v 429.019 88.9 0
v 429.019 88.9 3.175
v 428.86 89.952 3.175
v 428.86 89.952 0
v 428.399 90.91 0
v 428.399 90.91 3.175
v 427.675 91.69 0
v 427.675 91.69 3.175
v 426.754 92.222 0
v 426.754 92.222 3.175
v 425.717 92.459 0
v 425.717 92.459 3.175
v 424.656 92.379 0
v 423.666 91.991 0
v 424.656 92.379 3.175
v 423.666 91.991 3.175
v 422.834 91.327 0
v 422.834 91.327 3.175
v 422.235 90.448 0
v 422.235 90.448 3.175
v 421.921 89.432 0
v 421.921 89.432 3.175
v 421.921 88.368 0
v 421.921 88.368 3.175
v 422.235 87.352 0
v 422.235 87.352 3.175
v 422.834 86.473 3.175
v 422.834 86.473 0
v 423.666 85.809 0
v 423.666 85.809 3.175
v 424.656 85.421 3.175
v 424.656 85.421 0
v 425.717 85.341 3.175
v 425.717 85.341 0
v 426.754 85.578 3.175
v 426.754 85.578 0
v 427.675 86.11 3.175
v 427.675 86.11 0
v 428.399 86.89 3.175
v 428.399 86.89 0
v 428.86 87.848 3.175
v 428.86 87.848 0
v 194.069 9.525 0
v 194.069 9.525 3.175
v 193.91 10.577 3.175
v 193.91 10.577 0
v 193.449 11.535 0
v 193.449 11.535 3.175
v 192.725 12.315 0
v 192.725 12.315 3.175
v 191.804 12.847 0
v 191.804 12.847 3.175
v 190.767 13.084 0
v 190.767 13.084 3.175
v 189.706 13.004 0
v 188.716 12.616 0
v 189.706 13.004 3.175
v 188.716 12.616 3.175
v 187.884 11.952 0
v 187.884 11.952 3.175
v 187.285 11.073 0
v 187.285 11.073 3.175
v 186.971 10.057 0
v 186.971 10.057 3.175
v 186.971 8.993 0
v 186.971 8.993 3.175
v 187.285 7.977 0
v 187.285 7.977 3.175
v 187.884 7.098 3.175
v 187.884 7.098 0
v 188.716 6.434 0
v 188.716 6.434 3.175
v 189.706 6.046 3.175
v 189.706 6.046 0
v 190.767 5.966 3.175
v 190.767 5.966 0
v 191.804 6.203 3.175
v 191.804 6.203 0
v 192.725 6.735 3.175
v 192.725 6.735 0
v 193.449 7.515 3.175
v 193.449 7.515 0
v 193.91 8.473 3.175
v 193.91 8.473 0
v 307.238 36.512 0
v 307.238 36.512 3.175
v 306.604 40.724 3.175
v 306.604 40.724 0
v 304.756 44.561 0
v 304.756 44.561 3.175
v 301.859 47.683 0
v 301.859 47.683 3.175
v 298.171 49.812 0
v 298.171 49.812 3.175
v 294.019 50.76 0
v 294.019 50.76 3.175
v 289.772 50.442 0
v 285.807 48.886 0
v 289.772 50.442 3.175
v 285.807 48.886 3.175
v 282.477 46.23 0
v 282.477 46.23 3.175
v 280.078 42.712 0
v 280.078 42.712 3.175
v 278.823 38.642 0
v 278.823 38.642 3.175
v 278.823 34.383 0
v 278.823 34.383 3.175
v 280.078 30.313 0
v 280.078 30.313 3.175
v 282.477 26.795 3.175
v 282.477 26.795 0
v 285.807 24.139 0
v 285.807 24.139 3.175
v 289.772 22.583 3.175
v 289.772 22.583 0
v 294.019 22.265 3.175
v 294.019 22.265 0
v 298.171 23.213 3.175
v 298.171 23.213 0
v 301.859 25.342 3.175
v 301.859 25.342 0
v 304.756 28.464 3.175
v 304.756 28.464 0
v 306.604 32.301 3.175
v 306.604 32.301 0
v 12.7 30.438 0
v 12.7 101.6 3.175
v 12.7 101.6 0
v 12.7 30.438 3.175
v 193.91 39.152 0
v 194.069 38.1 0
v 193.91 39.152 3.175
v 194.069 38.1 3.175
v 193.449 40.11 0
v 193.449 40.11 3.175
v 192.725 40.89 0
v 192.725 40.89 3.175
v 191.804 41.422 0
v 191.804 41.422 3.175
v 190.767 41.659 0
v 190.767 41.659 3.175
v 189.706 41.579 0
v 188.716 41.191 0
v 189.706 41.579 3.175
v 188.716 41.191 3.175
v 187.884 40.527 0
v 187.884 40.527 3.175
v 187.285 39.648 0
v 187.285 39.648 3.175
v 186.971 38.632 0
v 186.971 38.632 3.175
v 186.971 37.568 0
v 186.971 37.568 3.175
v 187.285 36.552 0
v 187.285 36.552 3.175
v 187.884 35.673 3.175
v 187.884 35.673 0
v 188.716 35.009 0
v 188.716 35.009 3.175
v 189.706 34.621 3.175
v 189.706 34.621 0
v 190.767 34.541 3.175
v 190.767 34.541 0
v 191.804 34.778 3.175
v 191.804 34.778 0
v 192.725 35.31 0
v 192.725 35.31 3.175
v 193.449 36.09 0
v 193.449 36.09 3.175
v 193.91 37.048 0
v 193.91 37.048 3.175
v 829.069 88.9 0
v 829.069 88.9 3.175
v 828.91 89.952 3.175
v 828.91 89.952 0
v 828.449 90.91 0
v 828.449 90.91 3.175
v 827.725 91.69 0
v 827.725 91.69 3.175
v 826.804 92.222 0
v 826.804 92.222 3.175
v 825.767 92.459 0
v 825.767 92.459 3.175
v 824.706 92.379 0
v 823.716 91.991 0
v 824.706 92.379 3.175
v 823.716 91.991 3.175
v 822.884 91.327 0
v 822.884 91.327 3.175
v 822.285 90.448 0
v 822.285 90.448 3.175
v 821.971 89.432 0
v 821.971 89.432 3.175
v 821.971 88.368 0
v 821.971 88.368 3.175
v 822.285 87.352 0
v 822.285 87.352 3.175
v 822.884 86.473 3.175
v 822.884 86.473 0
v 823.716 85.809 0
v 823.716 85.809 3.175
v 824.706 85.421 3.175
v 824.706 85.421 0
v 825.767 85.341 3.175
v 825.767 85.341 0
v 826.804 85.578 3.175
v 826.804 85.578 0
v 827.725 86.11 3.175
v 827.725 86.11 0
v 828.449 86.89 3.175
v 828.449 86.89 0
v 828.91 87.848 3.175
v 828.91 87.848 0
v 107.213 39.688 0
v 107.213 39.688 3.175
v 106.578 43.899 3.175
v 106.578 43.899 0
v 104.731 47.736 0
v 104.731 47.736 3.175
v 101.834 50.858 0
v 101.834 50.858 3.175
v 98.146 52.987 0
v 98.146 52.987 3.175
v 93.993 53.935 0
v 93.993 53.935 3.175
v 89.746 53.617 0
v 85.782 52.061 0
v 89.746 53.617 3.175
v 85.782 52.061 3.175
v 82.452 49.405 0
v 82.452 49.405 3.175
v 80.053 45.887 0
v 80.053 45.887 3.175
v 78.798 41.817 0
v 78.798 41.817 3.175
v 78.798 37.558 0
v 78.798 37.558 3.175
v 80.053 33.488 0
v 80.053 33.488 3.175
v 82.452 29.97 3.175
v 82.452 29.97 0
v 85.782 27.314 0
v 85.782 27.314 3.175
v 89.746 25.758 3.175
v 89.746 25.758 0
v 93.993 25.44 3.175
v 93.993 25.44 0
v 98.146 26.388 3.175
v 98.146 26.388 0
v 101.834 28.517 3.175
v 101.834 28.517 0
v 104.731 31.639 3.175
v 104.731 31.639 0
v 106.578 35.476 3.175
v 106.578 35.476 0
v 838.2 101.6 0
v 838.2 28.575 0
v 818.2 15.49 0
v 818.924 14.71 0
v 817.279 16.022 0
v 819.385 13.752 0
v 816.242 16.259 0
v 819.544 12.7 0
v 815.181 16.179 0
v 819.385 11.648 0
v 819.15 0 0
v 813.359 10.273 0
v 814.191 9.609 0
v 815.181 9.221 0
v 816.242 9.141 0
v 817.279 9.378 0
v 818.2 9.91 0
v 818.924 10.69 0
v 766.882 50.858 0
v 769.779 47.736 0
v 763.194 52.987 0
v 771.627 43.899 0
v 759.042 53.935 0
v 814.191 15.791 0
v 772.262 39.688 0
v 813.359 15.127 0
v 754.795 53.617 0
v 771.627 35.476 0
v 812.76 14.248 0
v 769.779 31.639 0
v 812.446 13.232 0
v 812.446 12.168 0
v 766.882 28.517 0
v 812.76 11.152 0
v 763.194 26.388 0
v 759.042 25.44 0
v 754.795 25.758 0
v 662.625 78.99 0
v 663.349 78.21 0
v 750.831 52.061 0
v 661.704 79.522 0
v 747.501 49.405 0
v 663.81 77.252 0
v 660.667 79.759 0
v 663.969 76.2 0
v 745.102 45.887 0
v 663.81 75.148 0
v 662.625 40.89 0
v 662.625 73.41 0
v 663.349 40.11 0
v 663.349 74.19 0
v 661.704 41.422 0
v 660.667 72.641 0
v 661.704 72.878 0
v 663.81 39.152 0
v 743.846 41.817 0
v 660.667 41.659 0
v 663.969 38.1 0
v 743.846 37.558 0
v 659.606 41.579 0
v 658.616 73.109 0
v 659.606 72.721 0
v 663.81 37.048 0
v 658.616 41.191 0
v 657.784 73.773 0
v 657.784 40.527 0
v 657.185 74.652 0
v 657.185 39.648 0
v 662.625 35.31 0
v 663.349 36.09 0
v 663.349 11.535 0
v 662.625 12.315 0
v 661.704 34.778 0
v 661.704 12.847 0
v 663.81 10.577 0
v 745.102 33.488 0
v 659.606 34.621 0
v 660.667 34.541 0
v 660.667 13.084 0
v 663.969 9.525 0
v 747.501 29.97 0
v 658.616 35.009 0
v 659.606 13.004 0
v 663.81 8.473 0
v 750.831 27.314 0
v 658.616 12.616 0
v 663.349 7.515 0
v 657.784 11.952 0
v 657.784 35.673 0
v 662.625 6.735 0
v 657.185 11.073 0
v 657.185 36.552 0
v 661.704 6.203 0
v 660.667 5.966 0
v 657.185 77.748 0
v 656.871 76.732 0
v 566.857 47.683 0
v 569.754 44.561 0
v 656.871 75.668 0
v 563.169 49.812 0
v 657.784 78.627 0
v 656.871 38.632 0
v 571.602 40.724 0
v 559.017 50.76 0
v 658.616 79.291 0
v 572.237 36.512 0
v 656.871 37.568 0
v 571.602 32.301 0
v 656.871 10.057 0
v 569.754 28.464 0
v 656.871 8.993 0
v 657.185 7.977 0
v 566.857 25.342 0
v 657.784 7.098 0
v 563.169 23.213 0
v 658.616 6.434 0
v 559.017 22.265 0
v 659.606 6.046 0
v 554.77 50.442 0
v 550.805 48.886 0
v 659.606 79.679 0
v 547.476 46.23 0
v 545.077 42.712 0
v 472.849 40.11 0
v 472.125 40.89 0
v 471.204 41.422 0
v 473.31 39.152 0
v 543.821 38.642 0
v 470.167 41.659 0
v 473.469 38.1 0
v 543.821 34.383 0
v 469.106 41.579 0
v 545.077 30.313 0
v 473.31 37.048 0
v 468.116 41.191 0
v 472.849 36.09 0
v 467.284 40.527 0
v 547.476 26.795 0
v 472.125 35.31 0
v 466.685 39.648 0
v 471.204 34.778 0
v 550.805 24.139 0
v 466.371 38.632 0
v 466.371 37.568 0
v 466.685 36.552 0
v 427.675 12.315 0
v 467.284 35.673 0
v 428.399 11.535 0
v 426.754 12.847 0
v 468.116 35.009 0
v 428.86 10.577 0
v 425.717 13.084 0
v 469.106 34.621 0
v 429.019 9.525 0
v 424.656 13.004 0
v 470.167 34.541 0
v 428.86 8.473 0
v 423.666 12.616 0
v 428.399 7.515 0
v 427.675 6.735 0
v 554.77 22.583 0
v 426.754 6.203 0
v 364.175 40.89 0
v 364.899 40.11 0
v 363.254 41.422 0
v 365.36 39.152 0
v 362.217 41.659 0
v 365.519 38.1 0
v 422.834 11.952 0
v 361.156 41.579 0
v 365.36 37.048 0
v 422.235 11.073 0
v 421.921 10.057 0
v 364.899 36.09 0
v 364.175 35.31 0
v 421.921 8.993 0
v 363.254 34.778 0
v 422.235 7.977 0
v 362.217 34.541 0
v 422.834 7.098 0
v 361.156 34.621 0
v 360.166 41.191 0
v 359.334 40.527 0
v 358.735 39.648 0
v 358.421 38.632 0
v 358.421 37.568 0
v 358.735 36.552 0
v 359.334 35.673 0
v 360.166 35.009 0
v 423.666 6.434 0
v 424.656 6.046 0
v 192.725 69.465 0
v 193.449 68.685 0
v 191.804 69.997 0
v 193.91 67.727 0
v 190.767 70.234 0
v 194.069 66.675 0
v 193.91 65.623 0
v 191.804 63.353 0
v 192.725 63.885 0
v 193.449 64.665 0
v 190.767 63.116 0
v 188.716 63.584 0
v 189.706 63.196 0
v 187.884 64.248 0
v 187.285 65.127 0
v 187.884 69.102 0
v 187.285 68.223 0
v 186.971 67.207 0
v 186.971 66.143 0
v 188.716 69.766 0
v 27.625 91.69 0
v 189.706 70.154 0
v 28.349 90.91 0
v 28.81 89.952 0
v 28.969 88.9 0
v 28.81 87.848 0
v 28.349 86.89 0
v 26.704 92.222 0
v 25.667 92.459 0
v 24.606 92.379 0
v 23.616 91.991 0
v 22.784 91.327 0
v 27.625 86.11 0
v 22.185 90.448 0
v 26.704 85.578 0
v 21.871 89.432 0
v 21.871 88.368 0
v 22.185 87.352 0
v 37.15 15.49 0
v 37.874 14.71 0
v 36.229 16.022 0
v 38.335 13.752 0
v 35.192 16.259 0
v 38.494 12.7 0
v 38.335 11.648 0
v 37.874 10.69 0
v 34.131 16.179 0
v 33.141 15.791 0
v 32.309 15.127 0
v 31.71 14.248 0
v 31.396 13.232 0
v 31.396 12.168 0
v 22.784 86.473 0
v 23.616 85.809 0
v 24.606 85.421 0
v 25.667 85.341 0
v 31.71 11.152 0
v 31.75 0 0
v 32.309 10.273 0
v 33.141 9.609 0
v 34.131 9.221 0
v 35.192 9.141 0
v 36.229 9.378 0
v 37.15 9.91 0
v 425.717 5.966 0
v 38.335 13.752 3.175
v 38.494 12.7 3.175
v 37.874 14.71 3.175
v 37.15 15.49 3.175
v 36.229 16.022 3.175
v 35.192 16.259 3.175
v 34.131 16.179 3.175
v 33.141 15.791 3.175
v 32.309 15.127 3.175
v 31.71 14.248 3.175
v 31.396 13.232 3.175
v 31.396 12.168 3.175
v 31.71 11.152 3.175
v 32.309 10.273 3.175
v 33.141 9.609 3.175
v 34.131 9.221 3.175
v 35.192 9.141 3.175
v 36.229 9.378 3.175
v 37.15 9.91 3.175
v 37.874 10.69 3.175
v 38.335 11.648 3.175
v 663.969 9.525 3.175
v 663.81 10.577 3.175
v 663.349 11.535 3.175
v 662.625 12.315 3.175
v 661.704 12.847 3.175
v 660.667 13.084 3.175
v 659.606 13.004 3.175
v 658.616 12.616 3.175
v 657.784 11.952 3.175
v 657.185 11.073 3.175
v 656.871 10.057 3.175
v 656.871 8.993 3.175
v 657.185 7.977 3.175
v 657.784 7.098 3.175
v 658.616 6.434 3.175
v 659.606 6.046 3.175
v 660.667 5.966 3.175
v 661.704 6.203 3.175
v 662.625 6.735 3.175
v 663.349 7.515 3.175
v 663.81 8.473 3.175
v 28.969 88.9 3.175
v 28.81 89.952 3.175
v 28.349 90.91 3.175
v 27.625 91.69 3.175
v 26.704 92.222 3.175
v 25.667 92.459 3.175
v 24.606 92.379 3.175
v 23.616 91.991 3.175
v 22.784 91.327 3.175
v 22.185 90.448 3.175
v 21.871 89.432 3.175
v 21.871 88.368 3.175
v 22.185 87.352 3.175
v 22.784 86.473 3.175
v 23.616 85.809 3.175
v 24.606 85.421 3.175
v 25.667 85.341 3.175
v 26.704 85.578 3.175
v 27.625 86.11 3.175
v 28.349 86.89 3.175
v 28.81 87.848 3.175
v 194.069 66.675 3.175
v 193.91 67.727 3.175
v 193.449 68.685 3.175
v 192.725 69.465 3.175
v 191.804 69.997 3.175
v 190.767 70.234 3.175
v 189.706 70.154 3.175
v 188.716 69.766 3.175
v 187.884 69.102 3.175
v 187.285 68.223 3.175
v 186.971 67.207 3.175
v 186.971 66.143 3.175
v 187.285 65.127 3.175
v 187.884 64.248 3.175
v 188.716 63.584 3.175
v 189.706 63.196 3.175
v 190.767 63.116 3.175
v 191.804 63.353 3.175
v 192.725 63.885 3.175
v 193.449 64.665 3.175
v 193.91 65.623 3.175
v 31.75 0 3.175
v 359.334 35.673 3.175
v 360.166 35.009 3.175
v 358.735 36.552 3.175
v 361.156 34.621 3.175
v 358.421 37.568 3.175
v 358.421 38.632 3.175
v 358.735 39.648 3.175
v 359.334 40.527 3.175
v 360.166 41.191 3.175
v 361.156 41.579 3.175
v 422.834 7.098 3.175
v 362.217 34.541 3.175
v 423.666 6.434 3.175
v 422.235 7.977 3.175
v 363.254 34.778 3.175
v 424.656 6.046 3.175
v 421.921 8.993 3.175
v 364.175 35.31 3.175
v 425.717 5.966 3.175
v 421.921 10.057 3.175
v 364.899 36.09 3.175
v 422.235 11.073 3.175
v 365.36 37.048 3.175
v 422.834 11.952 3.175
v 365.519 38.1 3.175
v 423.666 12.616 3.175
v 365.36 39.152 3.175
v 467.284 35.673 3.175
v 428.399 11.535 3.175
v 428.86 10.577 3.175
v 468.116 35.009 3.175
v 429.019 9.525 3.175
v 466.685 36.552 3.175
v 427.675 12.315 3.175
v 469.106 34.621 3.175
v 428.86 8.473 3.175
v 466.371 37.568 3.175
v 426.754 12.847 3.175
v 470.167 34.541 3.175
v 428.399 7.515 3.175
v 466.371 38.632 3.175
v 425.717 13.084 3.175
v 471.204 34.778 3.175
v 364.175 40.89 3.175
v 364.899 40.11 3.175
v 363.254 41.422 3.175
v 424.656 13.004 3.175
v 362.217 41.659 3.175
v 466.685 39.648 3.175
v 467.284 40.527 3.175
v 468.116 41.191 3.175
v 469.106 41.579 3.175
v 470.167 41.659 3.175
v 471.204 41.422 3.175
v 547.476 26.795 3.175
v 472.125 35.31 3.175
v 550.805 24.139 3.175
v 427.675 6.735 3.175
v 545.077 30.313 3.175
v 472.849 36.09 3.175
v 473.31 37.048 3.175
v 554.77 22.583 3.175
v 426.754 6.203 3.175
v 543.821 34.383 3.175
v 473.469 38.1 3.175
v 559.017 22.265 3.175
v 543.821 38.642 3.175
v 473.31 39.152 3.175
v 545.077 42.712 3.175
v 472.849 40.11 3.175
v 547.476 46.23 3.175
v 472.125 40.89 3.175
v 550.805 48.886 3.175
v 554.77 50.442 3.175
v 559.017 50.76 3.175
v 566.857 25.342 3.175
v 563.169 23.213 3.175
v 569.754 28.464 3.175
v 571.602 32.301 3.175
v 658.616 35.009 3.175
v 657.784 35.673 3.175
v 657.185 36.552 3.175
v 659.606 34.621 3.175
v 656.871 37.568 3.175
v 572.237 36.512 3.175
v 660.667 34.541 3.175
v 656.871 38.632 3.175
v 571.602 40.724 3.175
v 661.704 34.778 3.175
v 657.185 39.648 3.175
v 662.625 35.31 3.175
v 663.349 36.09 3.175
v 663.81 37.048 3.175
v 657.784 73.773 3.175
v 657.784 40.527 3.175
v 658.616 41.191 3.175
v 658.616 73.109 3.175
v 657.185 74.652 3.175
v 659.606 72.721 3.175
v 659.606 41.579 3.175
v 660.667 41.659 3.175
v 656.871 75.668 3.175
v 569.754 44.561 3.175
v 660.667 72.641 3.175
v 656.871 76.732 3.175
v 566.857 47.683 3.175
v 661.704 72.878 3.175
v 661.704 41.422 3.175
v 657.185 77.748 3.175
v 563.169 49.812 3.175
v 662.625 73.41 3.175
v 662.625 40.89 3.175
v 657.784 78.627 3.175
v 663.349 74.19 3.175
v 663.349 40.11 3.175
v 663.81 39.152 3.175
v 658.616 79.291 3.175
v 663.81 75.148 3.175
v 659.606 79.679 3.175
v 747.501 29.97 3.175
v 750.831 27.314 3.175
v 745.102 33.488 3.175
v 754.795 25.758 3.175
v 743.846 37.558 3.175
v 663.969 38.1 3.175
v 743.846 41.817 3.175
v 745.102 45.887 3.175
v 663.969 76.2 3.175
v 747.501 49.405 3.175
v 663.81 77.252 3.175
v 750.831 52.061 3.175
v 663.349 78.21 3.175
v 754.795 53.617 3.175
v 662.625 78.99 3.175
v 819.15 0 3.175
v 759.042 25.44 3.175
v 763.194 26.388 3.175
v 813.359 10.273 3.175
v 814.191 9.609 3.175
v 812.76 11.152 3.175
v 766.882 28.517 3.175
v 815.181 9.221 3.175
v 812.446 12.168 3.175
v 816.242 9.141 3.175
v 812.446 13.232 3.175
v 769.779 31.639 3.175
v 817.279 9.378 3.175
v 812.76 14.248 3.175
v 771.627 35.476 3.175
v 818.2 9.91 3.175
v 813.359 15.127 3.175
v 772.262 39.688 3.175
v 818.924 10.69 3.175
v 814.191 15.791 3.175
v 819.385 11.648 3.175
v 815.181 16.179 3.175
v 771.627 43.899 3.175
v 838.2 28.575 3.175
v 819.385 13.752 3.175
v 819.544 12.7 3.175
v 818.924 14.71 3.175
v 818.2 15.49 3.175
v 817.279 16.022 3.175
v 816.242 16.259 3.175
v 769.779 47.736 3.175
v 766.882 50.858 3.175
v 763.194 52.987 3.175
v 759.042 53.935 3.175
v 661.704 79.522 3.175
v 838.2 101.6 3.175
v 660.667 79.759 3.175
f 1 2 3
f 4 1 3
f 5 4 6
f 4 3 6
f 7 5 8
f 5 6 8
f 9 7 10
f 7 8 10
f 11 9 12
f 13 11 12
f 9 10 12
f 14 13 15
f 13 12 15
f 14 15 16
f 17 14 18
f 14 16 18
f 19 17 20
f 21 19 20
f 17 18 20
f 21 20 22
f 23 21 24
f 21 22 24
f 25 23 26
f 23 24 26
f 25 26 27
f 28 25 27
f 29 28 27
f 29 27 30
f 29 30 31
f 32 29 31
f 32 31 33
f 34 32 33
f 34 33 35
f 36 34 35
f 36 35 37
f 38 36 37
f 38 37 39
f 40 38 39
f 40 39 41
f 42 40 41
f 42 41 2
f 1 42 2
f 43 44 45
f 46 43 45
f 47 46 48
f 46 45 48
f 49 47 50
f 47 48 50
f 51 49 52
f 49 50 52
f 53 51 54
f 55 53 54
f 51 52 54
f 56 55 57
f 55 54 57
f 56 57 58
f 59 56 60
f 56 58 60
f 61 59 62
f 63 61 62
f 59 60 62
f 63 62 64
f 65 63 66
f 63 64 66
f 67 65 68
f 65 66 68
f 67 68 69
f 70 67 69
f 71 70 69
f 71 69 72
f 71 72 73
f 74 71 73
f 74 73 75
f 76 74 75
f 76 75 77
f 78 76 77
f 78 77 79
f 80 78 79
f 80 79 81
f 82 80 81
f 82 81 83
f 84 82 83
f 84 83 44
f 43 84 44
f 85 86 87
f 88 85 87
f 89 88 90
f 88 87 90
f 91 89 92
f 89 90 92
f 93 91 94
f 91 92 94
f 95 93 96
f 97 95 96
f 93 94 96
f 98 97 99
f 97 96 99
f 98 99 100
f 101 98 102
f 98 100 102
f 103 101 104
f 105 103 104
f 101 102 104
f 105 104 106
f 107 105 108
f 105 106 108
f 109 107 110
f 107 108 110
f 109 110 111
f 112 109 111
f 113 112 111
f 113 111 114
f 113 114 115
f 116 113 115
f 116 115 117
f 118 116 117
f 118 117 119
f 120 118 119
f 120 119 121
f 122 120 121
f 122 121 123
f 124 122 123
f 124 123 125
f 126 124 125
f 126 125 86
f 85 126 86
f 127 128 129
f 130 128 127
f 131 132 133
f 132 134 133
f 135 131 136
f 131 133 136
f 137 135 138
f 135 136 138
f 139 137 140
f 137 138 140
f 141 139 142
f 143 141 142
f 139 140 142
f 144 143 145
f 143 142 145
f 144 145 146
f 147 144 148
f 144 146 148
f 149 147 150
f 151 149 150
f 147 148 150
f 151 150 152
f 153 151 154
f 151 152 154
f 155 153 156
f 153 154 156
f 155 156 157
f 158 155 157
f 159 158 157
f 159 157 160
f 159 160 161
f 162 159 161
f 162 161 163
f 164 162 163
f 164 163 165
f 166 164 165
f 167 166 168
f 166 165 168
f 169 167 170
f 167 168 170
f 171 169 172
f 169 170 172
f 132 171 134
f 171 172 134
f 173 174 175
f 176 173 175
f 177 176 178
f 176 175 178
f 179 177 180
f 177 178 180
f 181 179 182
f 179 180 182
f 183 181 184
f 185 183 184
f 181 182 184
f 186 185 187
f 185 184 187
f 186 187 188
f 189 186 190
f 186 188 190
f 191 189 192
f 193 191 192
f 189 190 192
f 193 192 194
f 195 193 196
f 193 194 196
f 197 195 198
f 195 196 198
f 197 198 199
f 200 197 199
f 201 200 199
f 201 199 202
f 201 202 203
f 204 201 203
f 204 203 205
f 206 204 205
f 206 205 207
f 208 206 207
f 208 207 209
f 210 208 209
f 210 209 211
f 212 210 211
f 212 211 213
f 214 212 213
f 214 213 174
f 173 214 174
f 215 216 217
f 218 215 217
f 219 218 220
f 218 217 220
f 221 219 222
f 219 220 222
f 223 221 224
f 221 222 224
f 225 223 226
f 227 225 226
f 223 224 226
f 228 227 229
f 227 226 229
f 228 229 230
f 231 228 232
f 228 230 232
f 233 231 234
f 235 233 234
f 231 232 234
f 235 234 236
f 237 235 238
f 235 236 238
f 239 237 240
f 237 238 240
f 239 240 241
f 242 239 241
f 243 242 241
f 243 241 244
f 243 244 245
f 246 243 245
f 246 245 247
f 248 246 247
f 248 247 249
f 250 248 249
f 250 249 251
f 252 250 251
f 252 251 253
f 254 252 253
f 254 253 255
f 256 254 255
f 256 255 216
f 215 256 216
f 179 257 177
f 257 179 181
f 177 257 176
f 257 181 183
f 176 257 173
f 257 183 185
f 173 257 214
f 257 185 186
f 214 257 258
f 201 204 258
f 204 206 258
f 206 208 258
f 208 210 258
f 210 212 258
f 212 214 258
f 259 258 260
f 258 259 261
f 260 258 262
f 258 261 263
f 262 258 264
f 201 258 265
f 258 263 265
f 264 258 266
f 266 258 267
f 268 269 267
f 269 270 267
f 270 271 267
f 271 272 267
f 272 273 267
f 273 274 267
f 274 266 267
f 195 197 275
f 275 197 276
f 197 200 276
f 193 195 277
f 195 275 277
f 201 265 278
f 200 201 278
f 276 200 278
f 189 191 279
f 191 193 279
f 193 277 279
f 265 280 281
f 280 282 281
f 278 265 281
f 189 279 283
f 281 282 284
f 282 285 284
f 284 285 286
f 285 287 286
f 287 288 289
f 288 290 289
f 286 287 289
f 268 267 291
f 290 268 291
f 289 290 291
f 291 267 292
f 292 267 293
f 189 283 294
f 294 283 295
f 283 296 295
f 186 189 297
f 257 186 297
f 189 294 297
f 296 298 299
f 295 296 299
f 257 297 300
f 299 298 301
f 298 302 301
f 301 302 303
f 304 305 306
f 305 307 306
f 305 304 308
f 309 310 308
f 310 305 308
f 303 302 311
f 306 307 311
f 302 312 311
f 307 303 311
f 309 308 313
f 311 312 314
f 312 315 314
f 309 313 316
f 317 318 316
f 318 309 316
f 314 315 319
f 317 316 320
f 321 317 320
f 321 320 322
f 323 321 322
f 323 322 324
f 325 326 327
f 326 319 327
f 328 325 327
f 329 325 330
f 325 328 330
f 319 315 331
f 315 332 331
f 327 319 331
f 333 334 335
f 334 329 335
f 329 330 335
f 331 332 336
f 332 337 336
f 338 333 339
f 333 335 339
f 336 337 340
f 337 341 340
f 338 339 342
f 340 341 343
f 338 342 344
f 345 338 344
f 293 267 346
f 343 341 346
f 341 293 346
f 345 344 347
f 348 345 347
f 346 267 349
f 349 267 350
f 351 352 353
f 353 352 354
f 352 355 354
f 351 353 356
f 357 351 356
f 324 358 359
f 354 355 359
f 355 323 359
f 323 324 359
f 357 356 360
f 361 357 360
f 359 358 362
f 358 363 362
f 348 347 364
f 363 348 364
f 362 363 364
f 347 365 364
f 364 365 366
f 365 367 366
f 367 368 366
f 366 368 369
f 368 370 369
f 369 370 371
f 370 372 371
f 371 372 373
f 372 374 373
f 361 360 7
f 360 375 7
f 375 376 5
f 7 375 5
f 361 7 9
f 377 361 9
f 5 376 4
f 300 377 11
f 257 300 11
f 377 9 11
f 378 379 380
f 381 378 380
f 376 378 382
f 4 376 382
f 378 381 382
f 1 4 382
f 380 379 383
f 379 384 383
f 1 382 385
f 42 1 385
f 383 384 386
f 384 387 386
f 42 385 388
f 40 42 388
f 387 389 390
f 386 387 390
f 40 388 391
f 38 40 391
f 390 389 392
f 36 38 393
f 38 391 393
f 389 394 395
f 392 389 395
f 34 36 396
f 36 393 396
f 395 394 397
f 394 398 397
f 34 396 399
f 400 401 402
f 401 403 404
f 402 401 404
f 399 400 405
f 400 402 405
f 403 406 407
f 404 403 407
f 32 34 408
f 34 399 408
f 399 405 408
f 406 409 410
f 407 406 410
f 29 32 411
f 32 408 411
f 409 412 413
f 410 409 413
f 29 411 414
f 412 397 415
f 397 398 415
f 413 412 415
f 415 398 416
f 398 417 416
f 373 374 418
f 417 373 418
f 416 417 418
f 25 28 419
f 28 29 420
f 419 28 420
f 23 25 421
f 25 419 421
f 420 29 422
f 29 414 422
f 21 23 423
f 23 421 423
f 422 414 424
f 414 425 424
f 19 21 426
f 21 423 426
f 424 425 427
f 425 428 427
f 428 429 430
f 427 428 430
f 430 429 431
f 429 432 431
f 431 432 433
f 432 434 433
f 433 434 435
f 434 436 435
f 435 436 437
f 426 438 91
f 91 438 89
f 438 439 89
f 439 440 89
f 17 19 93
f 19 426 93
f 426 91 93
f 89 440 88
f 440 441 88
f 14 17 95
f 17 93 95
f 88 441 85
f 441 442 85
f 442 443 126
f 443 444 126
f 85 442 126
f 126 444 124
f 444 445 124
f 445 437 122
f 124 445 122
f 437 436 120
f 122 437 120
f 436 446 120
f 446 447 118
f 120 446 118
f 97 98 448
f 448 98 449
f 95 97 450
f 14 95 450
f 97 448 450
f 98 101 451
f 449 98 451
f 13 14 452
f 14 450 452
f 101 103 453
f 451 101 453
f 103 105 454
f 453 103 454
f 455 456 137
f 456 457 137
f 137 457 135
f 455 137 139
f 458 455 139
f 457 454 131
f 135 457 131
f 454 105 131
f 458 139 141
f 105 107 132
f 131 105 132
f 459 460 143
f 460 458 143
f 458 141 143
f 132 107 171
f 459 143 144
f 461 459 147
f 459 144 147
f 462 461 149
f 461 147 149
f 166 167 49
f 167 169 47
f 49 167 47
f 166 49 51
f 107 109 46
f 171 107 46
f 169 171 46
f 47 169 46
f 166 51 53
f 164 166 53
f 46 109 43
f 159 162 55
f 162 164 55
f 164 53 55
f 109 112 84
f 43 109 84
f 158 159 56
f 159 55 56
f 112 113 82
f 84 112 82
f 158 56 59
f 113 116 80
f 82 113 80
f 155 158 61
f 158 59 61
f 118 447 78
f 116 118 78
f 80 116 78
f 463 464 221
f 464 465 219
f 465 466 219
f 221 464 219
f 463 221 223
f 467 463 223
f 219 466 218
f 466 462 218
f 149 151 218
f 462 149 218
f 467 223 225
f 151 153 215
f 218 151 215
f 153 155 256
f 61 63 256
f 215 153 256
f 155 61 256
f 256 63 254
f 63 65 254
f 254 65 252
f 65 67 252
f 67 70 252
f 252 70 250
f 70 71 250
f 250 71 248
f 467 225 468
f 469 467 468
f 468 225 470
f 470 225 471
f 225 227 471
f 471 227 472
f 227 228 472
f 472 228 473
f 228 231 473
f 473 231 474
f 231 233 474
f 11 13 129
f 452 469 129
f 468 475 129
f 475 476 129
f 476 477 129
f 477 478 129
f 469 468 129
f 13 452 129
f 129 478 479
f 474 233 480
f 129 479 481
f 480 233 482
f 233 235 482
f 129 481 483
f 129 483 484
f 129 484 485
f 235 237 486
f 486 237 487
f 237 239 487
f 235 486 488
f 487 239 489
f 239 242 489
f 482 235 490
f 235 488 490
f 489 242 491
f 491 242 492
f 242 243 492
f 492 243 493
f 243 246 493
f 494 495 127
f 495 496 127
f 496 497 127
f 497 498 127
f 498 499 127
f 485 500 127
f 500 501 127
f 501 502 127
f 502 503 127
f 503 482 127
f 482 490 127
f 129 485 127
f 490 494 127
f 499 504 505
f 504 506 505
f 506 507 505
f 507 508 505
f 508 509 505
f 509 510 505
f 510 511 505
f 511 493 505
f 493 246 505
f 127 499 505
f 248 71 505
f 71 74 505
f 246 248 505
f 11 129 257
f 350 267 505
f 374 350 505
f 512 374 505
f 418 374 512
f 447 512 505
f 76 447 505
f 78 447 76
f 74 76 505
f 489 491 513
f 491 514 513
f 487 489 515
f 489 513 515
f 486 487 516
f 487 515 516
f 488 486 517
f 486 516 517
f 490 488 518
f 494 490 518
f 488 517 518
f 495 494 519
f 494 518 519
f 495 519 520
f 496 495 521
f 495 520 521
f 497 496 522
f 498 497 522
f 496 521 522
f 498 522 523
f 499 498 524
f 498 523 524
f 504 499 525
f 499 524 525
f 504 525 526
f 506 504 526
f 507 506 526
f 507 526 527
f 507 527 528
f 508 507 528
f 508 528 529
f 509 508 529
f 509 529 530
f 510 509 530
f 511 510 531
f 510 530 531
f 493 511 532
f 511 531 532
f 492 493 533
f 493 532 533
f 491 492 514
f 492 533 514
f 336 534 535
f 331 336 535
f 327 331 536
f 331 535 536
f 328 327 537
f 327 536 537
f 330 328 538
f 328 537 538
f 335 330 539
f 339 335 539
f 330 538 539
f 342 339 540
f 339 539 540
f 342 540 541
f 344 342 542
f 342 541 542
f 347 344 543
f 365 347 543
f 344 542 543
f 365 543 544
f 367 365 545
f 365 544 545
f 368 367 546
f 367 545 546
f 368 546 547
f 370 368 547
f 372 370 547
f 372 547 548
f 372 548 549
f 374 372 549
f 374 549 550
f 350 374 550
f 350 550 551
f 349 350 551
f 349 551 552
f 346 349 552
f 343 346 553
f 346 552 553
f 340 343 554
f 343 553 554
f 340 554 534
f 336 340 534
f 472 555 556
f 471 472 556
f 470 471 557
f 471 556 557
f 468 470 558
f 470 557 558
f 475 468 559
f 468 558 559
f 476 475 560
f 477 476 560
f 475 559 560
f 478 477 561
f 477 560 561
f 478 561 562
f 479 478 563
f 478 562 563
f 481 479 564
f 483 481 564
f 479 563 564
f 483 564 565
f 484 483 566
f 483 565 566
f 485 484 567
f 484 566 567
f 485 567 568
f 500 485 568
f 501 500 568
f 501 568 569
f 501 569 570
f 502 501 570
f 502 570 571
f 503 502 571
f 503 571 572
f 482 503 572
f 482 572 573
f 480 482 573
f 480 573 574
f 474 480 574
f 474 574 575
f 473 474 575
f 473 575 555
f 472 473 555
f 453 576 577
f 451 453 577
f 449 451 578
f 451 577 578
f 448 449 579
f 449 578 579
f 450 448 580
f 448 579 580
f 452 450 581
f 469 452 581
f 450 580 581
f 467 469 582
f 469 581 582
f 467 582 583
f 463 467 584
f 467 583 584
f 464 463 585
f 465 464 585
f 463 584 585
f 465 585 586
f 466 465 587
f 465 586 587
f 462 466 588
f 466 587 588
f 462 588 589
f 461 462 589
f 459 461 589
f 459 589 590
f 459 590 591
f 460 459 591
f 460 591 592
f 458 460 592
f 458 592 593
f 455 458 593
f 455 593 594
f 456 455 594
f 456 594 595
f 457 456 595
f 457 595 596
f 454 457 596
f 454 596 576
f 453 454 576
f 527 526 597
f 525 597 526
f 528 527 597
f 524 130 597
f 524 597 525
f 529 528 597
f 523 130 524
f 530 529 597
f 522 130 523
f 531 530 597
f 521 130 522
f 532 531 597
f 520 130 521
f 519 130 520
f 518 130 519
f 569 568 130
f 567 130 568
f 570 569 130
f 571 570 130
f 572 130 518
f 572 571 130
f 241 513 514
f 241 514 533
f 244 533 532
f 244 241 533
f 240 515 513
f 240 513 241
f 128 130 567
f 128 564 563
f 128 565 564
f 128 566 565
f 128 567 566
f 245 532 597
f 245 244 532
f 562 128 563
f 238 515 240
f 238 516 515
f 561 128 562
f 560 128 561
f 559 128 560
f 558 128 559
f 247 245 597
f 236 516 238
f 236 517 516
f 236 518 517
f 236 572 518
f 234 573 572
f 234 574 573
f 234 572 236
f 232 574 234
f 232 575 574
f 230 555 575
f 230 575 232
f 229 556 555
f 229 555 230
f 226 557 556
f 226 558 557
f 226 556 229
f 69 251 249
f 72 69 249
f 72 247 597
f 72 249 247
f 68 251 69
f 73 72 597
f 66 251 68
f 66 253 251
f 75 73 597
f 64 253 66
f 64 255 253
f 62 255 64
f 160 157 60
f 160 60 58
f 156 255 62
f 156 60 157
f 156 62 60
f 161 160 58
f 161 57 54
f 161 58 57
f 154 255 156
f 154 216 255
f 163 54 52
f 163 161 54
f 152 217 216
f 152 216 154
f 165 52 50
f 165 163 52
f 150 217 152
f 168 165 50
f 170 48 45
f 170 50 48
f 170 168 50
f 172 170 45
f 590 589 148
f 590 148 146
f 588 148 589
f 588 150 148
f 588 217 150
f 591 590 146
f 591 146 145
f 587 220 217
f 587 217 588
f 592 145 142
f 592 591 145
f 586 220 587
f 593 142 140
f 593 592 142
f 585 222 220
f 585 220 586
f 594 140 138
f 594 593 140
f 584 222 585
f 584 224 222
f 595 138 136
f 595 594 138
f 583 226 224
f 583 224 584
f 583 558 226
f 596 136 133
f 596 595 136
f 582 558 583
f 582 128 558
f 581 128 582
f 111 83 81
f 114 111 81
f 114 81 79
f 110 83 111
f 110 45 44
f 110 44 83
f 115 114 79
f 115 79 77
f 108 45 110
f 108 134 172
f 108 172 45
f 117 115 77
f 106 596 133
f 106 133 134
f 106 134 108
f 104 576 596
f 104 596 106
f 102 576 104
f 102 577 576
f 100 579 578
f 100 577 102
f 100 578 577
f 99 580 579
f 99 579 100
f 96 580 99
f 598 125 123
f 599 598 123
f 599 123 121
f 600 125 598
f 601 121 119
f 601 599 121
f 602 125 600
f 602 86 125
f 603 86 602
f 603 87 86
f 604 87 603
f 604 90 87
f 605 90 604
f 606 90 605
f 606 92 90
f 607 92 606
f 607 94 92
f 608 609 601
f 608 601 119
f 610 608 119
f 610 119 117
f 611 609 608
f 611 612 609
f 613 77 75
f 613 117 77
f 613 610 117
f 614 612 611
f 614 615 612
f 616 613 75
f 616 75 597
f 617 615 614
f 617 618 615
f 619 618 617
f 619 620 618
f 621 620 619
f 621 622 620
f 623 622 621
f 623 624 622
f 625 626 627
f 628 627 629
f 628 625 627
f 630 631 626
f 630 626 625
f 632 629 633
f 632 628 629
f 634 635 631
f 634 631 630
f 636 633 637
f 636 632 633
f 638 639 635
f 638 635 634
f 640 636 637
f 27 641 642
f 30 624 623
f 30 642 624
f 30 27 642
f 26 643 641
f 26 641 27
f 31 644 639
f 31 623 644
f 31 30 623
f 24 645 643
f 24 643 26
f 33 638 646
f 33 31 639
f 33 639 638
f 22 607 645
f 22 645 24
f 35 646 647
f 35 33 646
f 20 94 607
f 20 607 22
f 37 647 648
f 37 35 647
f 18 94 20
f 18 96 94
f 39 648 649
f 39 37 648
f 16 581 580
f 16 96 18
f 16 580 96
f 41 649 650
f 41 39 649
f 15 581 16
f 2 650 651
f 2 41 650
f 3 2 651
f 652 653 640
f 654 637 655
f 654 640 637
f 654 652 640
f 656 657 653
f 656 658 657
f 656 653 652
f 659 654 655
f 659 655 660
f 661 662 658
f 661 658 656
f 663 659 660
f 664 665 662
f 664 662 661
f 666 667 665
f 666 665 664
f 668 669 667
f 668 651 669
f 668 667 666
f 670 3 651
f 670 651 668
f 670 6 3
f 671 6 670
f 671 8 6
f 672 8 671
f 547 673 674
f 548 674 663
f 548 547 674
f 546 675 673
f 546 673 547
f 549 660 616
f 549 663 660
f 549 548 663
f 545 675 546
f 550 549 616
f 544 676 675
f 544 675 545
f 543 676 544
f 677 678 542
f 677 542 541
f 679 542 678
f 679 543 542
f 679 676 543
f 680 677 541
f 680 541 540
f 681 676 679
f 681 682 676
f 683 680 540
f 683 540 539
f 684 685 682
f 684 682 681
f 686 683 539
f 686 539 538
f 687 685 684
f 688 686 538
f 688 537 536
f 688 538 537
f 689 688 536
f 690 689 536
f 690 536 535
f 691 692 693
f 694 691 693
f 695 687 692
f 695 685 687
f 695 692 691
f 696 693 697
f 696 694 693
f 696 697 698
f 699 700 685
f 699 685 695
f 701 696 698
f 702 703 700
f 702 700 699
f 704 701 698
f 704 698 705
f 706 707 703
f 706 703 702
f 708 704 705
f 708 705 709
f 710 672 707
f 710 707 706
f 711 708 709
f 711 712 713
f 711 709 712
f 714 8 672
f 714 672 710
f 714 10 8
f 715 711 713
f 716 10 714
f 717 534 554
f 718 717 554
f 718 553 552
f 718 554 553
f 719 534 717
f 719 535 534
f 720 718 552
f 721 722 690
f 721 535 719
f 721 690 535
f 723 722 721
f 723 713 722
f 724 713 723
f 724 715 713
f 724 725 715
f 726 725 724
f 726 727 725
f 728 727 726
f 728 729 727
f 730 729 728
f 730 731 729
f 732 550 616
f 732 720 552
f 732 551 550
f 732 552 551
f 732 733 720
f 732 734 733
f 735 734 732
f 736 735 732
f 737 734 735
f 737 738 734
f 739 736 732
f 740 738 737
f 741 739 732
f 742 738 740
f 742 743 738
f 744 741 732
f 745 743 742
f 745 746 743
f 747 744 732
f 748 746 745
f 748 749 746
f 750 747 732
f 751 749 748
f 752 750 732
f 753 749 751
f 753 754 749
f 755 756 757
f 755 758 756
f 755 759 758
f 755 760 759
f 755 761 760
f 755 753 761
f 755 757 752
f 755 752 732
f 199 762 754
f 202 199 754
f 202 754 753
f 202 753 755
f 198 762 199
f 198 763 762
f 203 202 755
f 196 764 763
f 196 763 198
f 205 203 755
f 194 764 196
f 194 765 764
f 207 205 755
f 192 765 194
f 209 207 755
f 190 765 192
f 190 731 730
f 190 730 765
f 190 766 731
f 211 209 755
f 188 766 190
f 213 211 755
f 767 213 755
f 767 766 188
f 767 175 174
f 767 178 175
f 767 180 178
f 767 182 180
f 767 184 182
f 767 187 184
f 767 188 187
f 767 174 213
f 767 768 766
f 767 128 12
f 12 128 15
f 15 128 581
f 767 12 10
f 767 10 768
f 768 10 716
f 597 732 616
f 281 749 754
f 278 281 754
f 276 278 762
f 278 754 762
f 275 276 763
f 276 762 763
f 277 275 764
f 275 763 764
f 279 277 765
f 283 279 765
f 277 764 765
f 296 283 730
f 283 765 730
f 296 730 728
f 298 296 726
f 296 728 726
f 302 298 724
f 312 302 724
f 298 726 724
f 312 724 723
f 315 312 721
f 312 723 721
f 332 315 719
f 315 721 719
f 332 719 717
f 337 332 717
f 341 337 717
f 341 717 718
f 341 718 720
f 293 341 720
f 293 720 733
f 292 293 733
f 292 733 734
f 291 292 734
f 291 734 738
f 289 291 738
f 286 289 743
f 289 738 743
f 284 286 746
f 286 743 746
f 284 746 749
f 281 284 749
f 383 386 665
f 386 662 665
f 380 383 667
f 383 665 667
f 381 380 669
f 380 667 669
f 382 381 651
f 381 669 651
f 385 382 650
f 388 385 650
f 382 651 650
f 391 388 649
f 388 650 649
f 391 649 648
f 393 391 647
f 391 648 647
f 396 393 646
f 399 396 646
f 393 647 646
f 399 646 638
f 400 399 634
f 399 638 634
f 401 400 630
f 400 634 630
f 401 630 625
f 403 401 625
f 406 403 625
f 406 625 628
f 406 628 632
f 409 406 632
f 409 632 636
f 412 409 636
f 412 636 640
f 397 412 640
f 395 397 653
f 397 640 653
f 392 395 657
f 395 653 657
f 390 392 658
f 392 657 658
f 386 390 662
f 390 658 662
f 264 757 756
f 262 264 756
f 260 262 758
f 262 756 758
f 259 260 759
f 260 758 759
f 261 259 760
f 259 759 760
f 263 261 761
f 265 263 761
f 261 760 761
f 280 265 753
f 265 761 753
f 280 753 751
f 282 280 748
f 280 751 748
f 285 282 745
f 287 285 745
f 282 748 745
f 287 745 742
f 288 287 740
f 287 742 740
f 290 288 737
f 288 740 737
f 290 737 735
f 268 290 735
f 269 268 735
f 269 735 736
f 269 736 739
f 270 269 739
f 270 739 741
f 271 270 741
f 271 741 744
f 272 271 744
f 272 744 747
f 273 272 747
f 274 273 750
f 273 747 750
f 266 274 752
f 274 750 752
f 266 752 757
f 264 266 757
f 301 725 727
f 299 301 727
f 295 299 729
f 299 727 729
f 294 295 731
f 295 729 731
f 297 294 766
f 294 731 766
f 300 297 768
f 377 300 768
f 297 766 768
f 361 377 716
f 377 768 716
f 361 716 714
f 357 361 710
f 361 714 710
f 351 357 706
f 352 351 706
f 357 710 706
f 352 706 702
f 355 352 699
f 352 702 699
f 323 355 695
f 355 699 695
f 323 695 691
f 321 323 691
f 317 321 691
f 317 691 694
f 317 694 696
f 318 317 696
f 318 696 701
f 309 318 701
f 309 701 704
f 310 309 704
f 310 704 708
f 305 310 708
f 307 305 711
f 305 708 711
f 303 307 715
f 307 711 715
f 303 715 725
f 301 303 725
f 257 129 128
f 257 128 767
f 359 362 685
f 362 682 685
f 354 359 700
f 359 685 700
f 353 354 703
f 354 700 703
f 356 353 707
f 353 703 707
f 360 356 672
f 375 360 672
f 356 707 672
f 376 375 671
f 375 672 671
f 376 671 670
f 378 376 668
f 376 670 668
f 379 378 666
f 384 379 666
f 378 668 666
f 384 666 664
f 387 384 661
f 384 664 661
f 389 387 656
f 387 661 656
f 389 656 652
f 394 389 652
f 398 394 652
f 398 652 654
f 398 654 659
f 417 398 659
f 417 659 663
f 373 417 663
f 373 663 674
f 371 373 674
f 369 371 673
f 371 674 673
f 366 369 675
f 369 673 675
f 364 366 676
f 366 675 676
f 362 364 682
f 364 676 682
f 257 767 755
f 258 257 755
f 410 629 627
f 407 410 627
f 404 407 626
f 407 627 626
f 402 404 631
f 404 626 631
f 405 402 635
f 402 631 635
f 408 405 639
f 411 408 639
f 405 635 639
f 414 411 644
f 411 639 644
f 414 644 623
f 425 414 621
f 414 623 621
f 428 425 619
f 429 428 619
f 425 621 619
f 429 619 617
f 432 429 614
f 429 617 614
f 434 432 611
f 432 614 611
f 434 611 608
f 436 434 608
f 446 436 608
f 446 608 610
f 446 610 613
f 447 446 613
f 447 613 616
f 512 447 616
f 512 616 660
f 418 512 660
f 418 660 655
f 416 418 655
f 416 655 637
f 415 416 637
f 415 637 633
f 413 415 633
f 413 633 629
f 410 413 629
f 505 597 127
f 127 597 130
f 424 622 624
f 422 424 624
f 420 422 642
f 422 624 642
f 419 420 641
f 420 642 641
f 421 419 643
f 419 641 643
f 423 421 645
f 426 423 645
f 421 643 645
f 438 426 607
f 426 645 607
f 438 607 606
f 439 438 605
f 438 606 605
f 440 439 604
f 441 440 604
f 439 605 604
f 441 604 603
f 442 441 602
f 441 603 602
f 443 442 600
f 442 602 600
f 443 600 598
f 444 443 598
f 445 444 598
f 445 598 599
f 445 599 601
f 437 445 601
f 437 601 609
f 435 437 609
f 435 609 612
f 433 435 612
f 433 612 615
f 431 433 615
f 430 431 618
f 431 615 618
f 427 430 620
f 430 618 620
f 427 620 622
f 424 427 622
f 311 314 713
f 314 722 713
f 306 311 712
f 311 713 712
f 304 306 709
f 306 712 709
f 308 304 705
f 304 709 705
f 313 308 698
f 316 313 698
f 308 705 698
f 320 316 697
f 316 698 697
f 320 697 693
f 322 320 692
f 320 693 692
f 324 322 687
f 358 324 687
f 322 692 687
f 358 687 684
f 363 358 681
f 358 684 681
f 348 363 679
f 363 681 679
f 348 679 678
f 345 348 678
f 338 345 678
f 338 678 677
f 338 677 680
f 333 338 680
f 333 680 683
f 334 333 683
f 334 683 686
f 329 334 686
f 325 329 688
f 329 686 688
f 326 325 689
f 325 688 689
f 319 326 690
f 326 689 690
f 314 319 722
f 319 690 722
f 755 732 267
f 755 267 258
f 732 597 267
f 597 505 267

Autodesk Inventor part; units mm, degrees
ref_plane "YZ Plane" through (0, 0, 0) normal (1, 0, 0) x (0, 1, 0)
ref_plane "XZ Plane" through (0, 0, 0) normal (0, 1, 0) x (-1, 0, 0)
ref_plane "XY Plane" through (0, 0, 0) normal (0, 0, 1) x (1, 0, 0)
sketch "Sketch1" plane through (0, 0, 0) normal (0, 0, 1) x (1, 0, 0)
  line L0 (0, 0) -> (850.9, 0)
  line L1 (850.9, 0) -> (850.9, 76.2)
  line L2 (850.9, 76.2) -> (0, 76.2)
  line L3 (0, 76.2) -> (0, 0)
  dimension "d0" = 850.9
  dimension "d1" = 76.2
extrude "Extrusion1" add sketch "Sketch1" along normal blind 3.175
sketch "Sketch4" plane through (0, 0, 3.175) normal (0, 0, 1) x (1, 0, 0)
  line L0 (0, 0) -> (0, 38.1)
  line L1 (0, 76.2) -> (0, 0) projected
  line L2 (0, 0) -> (25.4, 0)
  line L3 (0, 0) -> (850.9, 0) projected
  line L4 (25.4, 0) -> (0, 38.1)
  line L5 (850.9, 0) -> (825.5, 0)
  line L6 (850.9, 0) -> (850.9, 38.1)
  line L7 (850.9, 0) -> (850.9, 76.2) projected
  line L8 (850.9, 38.1) -> (825.5, 0)
  line L9 (0, 38.1) -> (0, 36.5125)
  circle A0 centre (292.9509, 36.5125) radius 14.2875
  circle A1 centre (557.9491, 36.5125) radius 14.2875
  circle A2 centre (757.9743, 39.6875) radius 14.2875
  circle A3 centre (92.9257, 39.6875) radius 14.2875
  dimension "d24" = 38.1
  dimension "d26" = 25.4
  dimension "d27" = 38.1
  dimension "d33" = 28.575
  dimension "d34" = 28.575
  dimension "d38" = 28.575
  dimension "d39" = 28.575
extrude "Extrusion3" cut sketch "Sketch4" against normal blind 3.175
sketch "Sketch5" plane through (0, 0, 3.175) normal (0, 0, 1) x (1, 0, 0)
  line L0 (850.9, 76.2) -> (0, 76.2) projected
  line L1 (0, 76.2) -> (425.45, 76.2)
  circle A0 centre (425.45, 66.675) radius 3.5687
  circle A1 centre (425.45, 9.525) radius 3.5687
  line L2 (25.4, 0) -> (825.5, 0) projected
  line L3 (0, 76.2) -> (190.5, 76.2)
  circle A2 centre (190.5, 66.675) radius 3.5687
  circle A3 centre (190.5, 9.525) radius 3.5687
  circle A4 centre (190.5, 38.1) radius 3.5687
  line L4 (850.9, 38.1) -> (850.9, 76.2) projected
  line L5 (850.9, 76.2) -> (660.4, 76.2)
  circle A5 centre (660.4, 66.675) radius 3.5687
  circle A6 centre (660.4, 9.525) radius 3.5687
  circle A7 centre (660.4, 38.1) radius 3.5687
  circle A8 centre (838.2, 63.5) radius 3.5687
  circle A9 centre (12.7, 63.5) radius 3.5687
  line L6 (0, 76.2) -> (0, 38.1) projected
  circle A10 centre (34.925, 12.7) radius 3.5687
  circle A11 centre (815.975, 12.7) radius 3.5687
  point P0 (0, 0)
  dimension "d42" = 425.45
  dimension "d43" = 7.1374
  dimension "d44" = 9.525
  dimension "d45" = 7.1374
  dimension "d46" = 9.525
  dimension "d47" = 190.5
  dimension "d48" = 7.1374
  dimension "d49" = 9.525
  dimension "d50" = 7.1374
  dimension "d51" = 9.525
  dimension "d52" = 7.1374
  dimension "d53" = 38.1
  dimension "d54" = 190.5
  dimension "d55" = 7.1374
  dimension "d56" = 9.525
  dimension "d57" = 7.1374
  dimension "d58" = 9.525
  dimension "d59" = 7.1374
  dimension "d60" = 38.1
  dimension "d61" = 7.1374
  dimension "d62" = 12.7
  dimension "d63" = 12.7
  dimension "d64" = 7.1374
  dimension "d65" = 12.7
  dimension "d66" = 12.7
  dimension "d67" = 7.1374
  dimension "d69" = 12.7
  dimension "d70" = 9.525
  dimension "d71" = 7.1374
  dimension "d72" = 12.7
  dimension "d73" = 9.525
extrude "Extrusion4" cut sketch "Sketch5" against normal blind 3.175
sketch "Sketch6" plane through (0, 0, 3.175) normal (0, 0, 1) x (1, 0, 0)
  circle A0 centre (361.95, 38.1) radius 3.5687
  circle A1 centre (469.9, 38.1) radius 3.5687
  line L0 (850.9, 76.2) -> (0, 76.2) projected
  circle A2 centre (292.9509, 36.5125) radius 14.2875 projected
  line L1 (0, 76.2) -> (0, 38.1) projected
  line L2 (850.9, 38.1) -> (850.9, 76.2) projected
  point P0 (0, 0)
  dimension "d76" = 7.1374
  dimension "d77" = 7.1374
  dimension "d78" = 38.1
  dimension "d79" = 38.1
  dimension "d82" = 381
  dimension "d83" = 361.95
extrude "Extrusion6" cut sketch "Sketch6" against normal blind 25.4 contours A0 | A1
sketch "Sketch7" plane through (0, 76.2, 0) normal (0, 1, 0) x (1, 0, 0)
  line L0 (850.9, 0) -> (0, 0) projected
  line L1 (0, 0) -> (0, -3.175) projected
  line L2 (850.9, -3.175) -> (0, -3.175) projected
  line L3 (850.9, 0) -> (850.9, -3.175) projected
extrude "Extrusion7" add sketch "Sketch7" along normal blind 25.4
sketch "Sketch8" plane through (0, 0, 3.175) normal (0, 0, 1) x (1, 0, 0)
  circle A0 centre (12.7, 63.5) radius 3.5687 projected
  circle A1 centre (838.2, 63.5) radius 3.5687 projected
  circle A2 centre (425.45, 66.675) radius 3.5687 projected
  point P0 (0, 0)
extrude "Extrusion9" add sketch "Sketch8" against normal blind 3.175
sketch "Sketch9" plane through (0, 0, 3.175) normal (0, 0, 1) x (1, 0, 0)
  circle A0 centre (12.7, 88.9) radius 3.5687
  line L0 (0, 101.6) -> (850.9, 101.6) projected
  line L1 (0, 38.1) -> (0, 101.6) projected
  circle A1 centre (838.2, 88.9) radius 3.5687
  line L2 (850.9, 38.1) -> (850.9, 101.6) projected
  circle A2 centre (425.45, 88.9) radius 3.5687
  point P0 (0, 0)
  dimension "d95" = 7.1374
  dimension "d96" = 12.7
  dimension "d97" = 12.7
  dimension "d98" = 7.1374
  dimension "d99" = 12.7
  dimension "d100" = 12.7
  dimension "d101" = 7.1374
extrude "Extrusion10" cut sketch "Sketch9" against normal blind 3.175
sketch "Sketch10" plane through (0, 0, 3.175) normal (0, 0, 1) x (1, 0, 0)
  line L0 (0, 38.1) -> (0, 101.6) projected
  line L1 (0, 101.6) -> (12.7, 101.6)
  line L2 (0, 101.6) -> (850.9, 101.6) projected
  line L3 (12.7, 101.6) -> (12.7, 19.05)
  line L4 (0, 38.1) -> (25.4, 0) projected
  line L5 (850.9, 101.6) -> (838.2, 101.6)
  line L6 (838.2, 101.6) -> (838.2, 19.05)
  line L7 (825.5, 0) -> (850.9, 38.1) projected
  line L8 (838.2, 19.05) -> (850.9, 38.1)
  line L9 (850.9, 38.1) -> (850.9, 101.6) projected
  line L10 (850.9, 101.6) -> (850.9, 38.1)
  line L11 (12.7, 19.05) -> (0, 38.1)
  line L12 (0, 101.6) -> (0, 38.1)
  point P0 (0, 0)
  dimension "d104" = 12.7
  dimension "d105" = 12.7
extrude "Extrusion11" cut sketch "Sketch10" against normal blind 25.4
sketch "Sketch11" plane through (0, 0, 3.175) normal (0, 0, 1) x (1, 0, 0)
  arc A0 (12.7, 85.3313) -> (12.7, 92.4687) centre (12.7, 88.9) ccw projected
  line L0 (12.7, 92.4687) -> (12.7, 85.3313)
  arc A1 (838.2, 92.4687) -> (838.2, 85.3313) centre (838.2, 88.9) ccw projected
  line L1 (838.2, 92.4687) -> (838.2, 85.3313)
  point P0 (0, 0)
extrude "Extrusion12" add sketch "Sketch11" against normal blind 3.175
sketch "Sketch12" plane through (0, 0, 3.175) normal (0, 0, 1) x (1, 0, 0)
  line L0 (25.4, 0) -> (825.5, 0) projected
  line L1 (25.4, 0) -> (31.75, 0)
  line L2 (31.75, 0) -> (12.7, 30.4376)
  line L3 (12.7, 19.05) -> (12.7, 101.6) projected
  line L4 (12.7, 30.4376) -> (12.7, 19.05)
  line L5 (25.4, 0) -> (12.7, 19.05) projected
  line L6 (12.7, 19.05) -> (25.4, 0)
  line L7 (25.4, 0) -> (31.75, 0)
  line L8 (25.4, 0) -> (12.7, 19.05)
  line L9 (838.2, 19.05) -> (825.5, 0) projected
  line L10 (825.5, 0) -> (819.15, 0)
  line L11 (819.15, 0) -> (838.2, 28.575)
  line L12 (838.2, 101.6) -> (838.2, 19.05) projected
  line L13 (838.2, 28.575) -> (838.2, 19.05)
  line L14 (838.2, 19.05) -> (825.5, 0)
  point P0 (0, 0)
  dimension "d111" = 6.35
  dimension "d113" = 6.35
extrude "Extrusion13" cut sketch "Sketch12" against normal blind 3.175
sketch "Sketch13" plane through (0, 0, 3.175) normal (0, 0, 1) x (1, 0, 0)
  circle A0 centre (25.4, 88.9) radius 3.5687
  line L0 (12.7, 101.6) -> (838.2, 101.6) projected
  line L1 (12.7, 101.6) -> (12.7, 30.4376) projected
  circle A1 centre (825.5, 88.9) radius 3.5687
  line L2 (838.2, 101.6) -> (838.2, 28.575) projected
  point P0 (0, 0)
  dimension "d116" = 7.1374
  dimension "d117" = 12.7
  dimension "d118" = 12.7
  dimension "d119" = 7.1374
  dimension "d120" = 12.7
  dimension "d121" = 12.7
extrude "Extrusion14" cut sketch "Sketch13" against normal blind 3.175
sketch "Sketch14" plane through (0, 0, 3.175) normal (0, 0, 1) x (1, 0, 0)
  circle A0 centre (660.4, 66.675) radius 3.5687 projected
  circle A1 centre (660.4, 38.1) radius 3.5687 projected
  point P0 (0, 0)
  dimension "d124" = 28.575
extrude "Extrusion15" add sketch "Sketch14" against normal blind 3.175 contours A0
sketch "Sketch15" plane through (0, 0, 3.175) normal (0, 0, 1) x (1, 0, 0)
  circle A0 centre (660.4, 38.1) radius 3.5687 projected
  circle A1 centre (660.4, 76.2) radius 3.5687
  point P0 (0, 0)
  dimension "d127" = 7.1374
  dimension "d128" = 38.1
extrude "Extrusion16" cut sketch "Sketch15" against normal blind 3.175 contours A1
properties part number "OutsidePlate2" material "Aluminum 6061"
